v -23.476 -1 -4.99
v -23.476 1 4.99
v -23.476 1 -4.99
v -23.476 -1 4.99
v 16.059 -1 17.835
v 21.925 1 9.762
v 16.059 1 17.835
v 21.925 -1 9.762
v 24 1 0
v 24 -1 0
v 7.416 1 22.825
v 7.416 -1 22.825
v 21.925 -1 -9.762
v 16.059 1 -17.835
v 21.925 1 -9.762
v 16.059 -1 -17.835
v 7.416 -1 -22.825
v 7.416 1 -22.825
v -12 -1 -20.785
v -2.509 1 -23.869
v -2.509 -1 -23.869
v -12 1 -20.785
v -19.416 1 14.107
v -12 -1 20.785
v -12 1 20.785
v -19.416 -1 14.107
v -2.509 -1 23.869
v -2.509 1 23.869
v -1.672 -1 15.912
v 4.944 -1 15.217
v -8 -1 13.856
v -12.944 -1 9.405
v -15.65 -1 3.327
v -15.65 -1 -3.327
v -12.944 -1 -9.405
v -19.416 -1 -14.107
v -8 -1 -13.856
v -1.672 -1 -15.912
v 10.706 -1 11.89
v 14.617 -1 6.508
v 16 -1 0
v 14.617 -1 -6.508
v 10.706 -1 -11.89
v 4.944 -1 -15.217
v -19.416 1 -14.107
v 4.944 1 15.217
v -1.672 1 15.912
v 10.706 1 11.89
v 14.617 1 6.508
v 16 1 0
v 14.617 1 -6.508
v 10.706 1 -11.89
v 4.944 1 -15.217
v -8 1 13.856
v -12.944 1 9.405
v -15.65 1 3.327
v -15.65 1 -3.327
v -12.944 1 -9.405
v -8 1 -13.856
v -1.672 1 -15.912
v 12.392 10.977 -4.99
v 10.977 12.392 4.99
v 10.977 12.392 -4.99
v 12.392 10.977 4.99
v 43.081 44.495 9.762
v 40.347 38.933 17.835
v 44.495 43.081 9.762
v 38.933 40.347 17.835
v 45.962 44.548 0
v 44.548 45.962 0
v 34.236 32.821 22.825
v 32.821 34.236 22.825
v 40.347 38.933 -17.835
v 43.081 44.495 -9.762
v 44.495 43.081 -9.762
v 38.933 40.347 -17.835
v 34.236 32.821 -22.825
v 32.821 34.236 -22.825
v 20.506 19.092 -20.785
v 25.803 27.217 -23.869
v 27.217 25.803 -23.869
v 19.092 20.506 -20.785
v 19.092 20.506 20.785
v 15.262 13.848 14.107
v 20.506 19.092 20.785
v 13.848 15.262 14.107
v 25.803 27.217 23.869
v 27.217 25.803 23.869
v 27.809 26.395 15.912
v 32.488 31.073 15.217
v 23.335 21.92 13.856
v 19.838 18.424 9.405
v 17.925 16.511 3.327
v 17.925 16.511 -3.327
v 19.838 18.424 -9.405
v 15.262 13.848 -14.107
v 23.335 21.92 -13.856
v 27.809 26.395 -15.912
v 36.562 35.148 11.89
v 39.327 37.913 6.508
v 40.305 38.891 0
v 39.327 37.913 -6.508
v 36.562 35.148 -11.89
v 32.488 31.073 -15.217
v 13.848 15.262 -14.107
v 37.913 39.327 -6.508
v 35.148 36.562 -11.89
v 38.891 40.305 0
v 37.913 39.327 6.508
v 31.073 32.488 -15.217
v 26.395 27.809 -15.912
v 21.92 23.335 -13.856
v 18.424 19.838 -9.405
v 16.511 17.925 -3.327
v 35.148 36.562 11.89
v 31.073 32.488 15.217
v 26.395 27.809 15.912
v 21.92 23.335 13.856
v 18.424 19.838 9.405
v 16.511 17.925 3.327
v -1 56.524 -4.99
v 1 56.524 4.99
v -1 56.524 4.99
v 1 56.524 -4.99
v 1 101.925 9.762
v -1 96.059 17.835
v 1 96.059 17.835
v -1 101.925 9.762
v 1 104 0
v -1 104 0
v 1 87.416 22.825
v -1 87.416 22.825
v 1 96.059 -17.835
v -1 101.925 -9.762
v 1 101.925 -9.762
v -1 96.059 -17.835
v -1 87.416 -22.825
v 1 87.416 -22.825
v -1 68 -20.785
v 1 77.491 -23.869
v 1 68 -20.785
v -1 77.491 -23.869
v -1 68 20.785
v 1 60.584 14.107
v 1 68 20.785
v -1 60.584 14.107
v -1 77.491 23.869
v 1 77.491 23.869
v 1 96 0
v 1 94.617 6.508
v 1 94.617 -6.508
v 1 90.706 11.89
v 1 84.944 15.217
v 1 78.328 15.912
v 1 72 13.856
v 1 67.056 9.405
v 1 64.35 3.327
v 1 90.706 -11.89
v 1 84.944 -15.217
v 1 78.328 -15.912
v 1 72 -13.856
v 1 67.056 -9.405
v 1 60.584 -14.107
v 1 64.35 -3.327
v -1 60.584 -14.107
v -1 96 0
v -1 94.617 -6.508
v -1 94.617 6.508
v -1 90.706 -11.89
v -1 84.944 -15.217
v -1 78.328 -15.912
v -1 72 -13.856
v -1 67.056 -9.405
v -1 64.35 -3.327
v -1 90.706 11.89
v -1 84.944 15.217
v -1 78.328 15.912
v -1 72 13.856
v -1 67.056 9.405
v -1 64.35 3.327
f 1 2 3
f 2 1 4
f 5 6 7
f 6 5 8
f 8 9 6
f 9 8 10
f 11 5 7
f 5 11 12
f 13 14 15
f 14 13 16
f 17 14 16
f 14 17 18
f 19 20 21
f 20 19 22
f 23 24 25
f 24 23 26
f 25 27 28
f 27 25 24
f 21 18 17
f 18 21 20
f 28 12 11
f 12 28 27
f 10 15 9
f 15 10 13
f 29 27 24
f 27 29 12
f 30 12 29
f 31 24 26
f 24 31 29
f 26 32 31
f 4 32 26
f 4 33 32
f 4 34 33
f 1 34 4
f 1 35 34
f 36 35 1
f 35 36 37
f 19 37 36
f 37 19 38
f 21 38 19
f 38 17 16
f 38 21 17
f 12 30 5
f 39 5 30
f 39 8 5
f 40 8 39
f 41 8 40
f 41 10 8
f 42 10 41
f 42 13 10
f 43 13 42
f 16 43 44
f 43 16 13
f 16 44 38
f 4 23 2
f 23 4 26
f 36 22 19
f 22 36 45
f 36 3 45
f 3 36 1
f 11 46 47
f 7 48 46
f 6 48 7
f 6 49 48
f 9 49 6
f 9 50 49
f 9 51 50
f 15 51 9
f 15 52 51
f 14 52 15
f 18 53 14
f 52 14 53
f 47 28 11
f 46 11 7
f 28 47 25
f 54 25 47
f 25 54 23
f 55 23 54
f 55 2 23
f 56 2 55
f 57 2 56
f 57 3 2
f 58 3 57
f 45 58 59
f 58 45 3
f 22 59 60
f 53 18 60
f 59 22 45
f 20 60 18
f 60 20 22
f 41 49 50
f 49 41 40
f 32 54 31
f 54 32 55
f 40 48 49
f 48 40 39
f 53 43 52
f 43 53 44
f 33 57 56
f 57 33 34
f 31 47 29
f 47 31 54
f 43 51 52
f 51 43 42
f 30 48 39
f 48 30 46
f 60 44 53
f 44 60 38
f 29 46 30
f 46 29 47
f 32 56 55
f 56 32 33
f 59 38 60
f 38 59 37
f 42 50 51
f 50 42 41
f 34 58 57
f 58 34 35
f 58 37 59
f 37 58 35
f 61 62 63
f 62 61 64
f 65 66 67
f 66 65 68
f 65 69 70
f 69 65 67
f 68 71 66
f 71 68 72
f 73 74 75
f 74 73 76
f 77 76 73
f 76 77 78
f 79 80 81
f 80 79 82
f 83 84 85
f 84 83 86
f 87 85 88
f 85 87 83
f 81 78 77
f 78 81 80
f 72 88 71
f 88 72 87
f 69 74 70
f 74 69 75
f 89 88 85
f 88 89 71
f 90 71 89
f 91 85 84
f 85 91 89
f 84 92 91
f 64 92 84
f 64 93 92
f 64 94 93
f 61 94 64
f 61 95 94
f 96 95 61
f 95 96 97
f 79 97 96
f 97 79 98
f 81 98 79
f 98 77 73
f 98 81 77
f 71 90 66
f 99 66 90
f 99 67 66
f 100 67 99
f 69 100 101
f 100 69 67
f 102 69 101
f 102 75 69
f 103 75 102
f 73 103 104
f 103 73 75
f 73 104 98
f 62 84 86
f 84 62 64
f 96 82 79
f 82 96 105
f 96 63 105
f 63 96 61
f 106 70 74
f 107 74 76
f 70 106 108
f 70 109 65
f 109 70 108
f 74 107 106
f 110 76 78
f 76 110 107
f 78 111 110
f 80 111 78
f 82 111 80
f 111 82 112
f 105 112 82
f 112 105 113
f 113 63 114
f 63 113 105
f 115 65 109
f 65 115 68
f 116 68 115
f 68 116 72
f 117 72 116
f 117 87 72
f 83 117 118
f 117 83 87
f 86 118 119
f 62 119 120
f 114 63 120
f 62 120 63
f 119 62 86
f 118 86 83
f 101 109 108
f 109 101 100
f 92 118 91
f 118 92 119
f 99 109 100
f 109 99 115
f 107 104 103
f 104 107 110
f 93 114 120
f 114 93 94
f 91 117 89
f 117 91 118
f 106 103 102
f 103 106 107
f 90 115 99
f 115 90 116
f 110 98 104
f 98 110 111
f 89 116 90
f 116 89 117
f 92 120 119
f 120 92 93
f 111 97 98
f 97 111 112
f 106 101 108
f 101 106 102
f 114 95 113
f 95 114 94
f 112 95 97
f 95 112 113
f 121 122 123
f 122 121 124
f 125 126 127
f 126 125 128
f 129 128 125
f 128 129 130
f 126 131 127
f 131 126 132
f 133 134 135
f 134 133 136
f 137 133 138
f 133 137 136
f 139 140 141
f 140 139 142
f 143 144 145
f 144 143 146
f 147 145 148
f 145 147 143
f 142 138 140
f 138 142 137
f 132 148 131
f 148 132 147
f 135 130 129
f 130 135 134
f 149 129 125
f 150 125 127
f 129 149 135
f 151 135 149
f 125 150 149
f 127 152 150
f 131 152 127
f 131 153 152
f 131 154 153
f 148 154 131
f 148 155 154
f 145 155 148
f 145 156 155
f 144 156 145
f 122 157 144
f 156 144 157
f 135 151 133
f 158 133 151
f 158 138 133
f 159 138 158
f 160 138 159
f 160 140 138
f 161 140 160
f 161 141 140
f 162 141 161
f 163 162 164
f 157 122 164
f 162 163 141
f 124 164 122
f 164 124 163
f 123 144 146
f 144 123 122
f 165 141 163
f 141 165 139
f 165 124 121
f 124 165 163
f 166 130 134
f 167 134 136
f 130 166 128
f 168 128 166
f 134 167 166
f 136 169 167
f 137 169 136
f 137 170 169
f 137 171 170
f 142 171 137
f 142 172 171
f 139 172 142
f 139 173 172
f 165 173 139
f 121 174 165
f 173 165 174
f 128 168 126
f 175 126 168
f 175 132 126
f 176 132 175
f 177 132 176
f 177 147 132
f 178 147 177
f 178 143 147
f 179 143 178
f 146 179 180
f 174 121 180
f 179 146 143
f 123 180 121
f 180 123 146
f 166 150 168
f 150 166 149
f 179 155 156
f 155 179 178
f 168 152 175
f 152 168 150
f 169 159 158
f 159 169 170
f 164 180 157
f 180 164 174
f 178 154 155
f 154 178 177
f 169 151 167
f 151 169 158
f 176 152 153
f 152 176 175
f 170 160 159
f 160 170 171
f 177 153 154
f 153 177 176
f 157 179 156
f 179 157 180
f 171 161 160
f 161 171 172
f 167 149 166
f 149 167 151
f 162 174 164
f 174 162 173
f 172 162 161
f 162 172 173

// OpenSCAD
//User Inputs
PODS = 3;			//Unit: num of pods; Affects: get_height, make_spiral
RENDER = 15;		//Unit: resolution; Keep at 12 until you have a winning shape, then 25-50 for final render.

//Process Inputs
$fn = RENDER;			//Unit: fragments; controls render settings
LEG_ANGLE = 20; 	//Unit: degrees; angle between XY plane and leg
LEG_LENGTH = 80;	//Unit: mm; represents dist along XY plane, not diagonal len of leg;
LEG_DIAM = 10;		//Unit: mm
LEG_COUNT = 3;		//Unit: num of legs
FEET_TYPE = "hole";	//Options: round, flat, hole, frog; end caps for feet - use flat/hole if you want to attach pads
MAST_DIAM = 12;		//Unit: mm; diam of center column
FEET_HOLE_DIAM = 4;	//Unit: mm
BLEND_RADIUS = 0.1;	//Unit: mm; corner breaking radius for Minkowski op
SHELL = 2;			//Unit: mm; wall thickness

//***See make_pod_tree for Spiral Input Variables***//

//Module Debugging
make_base();
make_pod_hole();
!make_pod_tree();

module make_base(){
	//MODULE VARIABLES
	mast_len = get_mast_len();		//Gets the distance from spiral to feet top
	angle = 360/LEG_COUNT;			//Angle between each leg
	mast_rise = FEET_TYPE=="round" ? LEG_LENGTH*tan(LEG_ANGLE) + LEG_DIAM/2 : LEG_LENGTH*tan(LEG_ANGLE);
	leg_hypotenuse = LEG_LENGTH/cos(LEG_ANGLE);
	//Generate mast (center column)
	color("FireBrick") {//minkowski(){ 
		union(){
			translate([0,0,mast_rise]) cylinder(d=MAST_DIAM, h=mast_len);
			make_legs(mast_rise,leg_hypotenuse,angle);		
		}
		sphere(BLEND_RADIUS);
	}
}

module make_legs(mast_rise=1, leg_hypotenuse=1, angle=90) {
	choice = FEET_TYPE =="round" ? 1: 
	 FEET_TYPE == "flat" ? 2:
	 FEET_TYPE == "hole" ? 3:
	 FEET_TYPE == "frog" ? 4:
		//Default feet type is rounded
		1;
	//Round feet
	if(choice==1){
		for(i=[1:LEG_COUNT]){
			translate([0,0,mast_rise]) rotate([90+LEG_ANGLE,0,angle*i]) cylinder(d=LEG_DIAM,h=leg_hypotenuse);
			rotate([0,0,angle*i]) translate([0,-LEG_LENGTH,LEG_DIAM/2]) sphere(LEG_DIAM/2);
		}
	}
	//Flat bottom feet with round ends
	if(choice==2){
		for(i=[1:LEG_COUNT]){
			difference(){
				union(){
					translate([0,0,mast_rise]) rotate([90+LEG_ANGLE,0,angle*i]) cylinder(d=LEG_DIAM,h=leg_hypotenuse);
					rotate([0,0,angle*i]) translate([0,-LEG_LENGTH,0]) sphere(LEG_DIAM/2);
				}
				translate([0,0,-LEG_DIAM/2]) cylinder(r=leg_hypotenuse+LEG_DIAM,h=LEG_DIAM,center=true);
			}
		}
	}
	//Flat bottom feet with round ends and thru hole
	if(choice==3){
		for(i=[1:LEG_COUNT]){
			difference(){
				union(){
					translate([0,0,mast_rise]) rotate([90+LEG_ANGLE,0,angle*i]) cylinder(d=LEG_DIAM,h=leg_hypotenuse);
					rotate([0,0,angle*i]) translate([0,-LEG_LENGTH,0]) sphere(LEG_DIAM/2);
				}
				translate([0,0,-LEG_DIAM/2]) cylinder(r=leg_hypotenuse+LEG_DIAM,h=LEG_DIAM,center=true);
				rotate([0,0,angle*i]) translate([0,-LEG_LENGTH,-1]) cylinder(d=FEET_HOLE_DIAM, h=LEG_DIAM*2);
			}
		}
	}
	//Flat bottom feet with large round ends
	if(choice==4){
		for(i=[1:LEG_COUNT]){
			difference(){
				union(){
					translate([0,0,mast_rise]) rotate([90+LEG_ANGLE,0,angle*i]) cylinder(d=LEG_DIAM,h=leg_hypotenuse);
					rotate([0,0,angle*i]) translate([0,-LEG_LENGTH,0]) scale([1,1,0.5]) sphere(LEG_DIAM);
				}
				translate([0,0,-LEG_DIAM/2]) cylinder(r=leg_hypotenuse+LEG_DIAM,h=LEG_DIAM,center=true);
			}
		}
	}
}  

//SPIRAL ALGORITHM INPUTS 
ANGLE0 = [90,0,0];		//Unit: degrees; base orientation of each pod
ANGLE_STEP = [0,0,PODS*30];	//Unit: degrees; degrees to increment for next pod
COORD0 = [0,0,0];		//test
COORD_STEP = [0,0,0];	//test
POD_DIAM = 32;			//Unit: mm; diameter of top of pod
POD_CS = 8;				//Unit: mm; Outer diamer to inner diameter of hole
HOLE_TYPE = "ring";		//Unit: ring, sheet, octagon 

module make_pod_tree(){
	//MODULE VARIABLES
	current_angle = [0,0,0];

	for(i = [0:PODS-1]){
		rotate((i/(PODS-1)) * ANGLE_STEP) translate([i/(PODS-1) * LEG_LENGTH ,0,0])
		rotate(ANGLE0) translate(COORD0) make_pod_hole();
	}
}

module make_pod_hole(type = "ring"){
	//MODULE VARIABLES
	if(type=="ring"){
		difference(){
			cylinder(d=POD_DIAM+POD_CS*2,h=SHELL,center=true);
			cylinder(d=POD_DIAM,h=SHELL+2,center=true);
		}
	}

	if(type=="sheet"){
		difference(){
			cube([POD_DIAM+POD_CS*2, POD_DIAM+POD_CS*2,SHELL],center=true);
			cylinder(d=POD_DIAM,h=SHELL+2,center=true);
		}
	}

}

function get_mast_len() = PODS * 1;
